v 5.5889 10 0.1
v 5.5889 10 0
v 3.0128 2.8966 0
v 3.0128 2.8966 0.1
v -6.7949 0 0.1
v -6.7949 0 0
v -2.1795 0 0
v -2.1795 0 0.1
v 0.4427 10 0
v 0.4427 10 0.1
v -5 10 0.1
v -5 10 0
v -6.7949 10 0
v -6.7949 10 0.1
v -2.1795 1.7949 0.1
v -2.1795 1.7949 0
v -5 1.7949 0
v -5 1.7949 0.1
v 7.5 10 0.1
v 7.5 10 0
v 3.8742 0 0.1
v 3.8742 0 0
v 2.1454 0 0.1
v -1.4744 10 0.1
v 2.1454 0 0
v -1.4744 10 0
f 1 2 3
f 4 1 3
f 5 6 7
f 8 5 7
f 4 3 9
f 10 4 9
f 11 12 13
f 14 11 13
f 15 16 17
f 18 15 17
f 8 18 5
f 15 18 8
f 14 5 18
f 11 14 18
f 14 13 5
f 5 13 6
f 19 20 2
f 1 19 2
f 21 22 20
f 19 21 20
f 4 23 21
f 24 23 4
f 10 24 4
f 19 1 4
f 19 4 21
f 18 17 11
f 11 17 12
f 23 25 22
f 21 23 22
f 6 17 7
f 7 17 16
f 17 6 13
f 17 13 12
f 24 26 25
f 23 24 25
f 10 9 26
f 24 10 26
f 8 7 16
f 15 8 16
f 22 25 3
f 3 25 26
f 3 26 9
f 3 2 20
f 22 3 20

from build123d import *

# Parameters (mm, degrees)
BOSS_EXTRUDE1_DEPTH   = 0.1
BOSS_EXTRUDE1_2_DEPTH = 0.1


with BuildPart() as part:
    # Sketch1 → Boss-Extrude1 (new body)
    with BuildSketch(Plane.XY):
        Polygon((-6.794871795, 10), (-6.794871795, 0), (-2.179487179, 0), (-2.179487179, 1.794871795), (-5, 1.794871795), (-5, 10), align=None)
    extrude(amount=BOSS_EXTRUDE1_DEPTH)


with BuildPart() as body_2:
    # Sketch1 → Boss-Extrude1 2 (new body)
    with BuildSketch(Plane.XY):
        Polygon((-1.474358974, 10), (2.145432692, 0), (3.874198718, 0), (7.5, 10), (5.588942308, 10), (3.012820513, 2.896634615), (0.442708333, 10), align=None)
    extrude(amount=BOSS_EXTRUDE1_2_DEPTH)


solid = Compound([part.part, body_2.part])
